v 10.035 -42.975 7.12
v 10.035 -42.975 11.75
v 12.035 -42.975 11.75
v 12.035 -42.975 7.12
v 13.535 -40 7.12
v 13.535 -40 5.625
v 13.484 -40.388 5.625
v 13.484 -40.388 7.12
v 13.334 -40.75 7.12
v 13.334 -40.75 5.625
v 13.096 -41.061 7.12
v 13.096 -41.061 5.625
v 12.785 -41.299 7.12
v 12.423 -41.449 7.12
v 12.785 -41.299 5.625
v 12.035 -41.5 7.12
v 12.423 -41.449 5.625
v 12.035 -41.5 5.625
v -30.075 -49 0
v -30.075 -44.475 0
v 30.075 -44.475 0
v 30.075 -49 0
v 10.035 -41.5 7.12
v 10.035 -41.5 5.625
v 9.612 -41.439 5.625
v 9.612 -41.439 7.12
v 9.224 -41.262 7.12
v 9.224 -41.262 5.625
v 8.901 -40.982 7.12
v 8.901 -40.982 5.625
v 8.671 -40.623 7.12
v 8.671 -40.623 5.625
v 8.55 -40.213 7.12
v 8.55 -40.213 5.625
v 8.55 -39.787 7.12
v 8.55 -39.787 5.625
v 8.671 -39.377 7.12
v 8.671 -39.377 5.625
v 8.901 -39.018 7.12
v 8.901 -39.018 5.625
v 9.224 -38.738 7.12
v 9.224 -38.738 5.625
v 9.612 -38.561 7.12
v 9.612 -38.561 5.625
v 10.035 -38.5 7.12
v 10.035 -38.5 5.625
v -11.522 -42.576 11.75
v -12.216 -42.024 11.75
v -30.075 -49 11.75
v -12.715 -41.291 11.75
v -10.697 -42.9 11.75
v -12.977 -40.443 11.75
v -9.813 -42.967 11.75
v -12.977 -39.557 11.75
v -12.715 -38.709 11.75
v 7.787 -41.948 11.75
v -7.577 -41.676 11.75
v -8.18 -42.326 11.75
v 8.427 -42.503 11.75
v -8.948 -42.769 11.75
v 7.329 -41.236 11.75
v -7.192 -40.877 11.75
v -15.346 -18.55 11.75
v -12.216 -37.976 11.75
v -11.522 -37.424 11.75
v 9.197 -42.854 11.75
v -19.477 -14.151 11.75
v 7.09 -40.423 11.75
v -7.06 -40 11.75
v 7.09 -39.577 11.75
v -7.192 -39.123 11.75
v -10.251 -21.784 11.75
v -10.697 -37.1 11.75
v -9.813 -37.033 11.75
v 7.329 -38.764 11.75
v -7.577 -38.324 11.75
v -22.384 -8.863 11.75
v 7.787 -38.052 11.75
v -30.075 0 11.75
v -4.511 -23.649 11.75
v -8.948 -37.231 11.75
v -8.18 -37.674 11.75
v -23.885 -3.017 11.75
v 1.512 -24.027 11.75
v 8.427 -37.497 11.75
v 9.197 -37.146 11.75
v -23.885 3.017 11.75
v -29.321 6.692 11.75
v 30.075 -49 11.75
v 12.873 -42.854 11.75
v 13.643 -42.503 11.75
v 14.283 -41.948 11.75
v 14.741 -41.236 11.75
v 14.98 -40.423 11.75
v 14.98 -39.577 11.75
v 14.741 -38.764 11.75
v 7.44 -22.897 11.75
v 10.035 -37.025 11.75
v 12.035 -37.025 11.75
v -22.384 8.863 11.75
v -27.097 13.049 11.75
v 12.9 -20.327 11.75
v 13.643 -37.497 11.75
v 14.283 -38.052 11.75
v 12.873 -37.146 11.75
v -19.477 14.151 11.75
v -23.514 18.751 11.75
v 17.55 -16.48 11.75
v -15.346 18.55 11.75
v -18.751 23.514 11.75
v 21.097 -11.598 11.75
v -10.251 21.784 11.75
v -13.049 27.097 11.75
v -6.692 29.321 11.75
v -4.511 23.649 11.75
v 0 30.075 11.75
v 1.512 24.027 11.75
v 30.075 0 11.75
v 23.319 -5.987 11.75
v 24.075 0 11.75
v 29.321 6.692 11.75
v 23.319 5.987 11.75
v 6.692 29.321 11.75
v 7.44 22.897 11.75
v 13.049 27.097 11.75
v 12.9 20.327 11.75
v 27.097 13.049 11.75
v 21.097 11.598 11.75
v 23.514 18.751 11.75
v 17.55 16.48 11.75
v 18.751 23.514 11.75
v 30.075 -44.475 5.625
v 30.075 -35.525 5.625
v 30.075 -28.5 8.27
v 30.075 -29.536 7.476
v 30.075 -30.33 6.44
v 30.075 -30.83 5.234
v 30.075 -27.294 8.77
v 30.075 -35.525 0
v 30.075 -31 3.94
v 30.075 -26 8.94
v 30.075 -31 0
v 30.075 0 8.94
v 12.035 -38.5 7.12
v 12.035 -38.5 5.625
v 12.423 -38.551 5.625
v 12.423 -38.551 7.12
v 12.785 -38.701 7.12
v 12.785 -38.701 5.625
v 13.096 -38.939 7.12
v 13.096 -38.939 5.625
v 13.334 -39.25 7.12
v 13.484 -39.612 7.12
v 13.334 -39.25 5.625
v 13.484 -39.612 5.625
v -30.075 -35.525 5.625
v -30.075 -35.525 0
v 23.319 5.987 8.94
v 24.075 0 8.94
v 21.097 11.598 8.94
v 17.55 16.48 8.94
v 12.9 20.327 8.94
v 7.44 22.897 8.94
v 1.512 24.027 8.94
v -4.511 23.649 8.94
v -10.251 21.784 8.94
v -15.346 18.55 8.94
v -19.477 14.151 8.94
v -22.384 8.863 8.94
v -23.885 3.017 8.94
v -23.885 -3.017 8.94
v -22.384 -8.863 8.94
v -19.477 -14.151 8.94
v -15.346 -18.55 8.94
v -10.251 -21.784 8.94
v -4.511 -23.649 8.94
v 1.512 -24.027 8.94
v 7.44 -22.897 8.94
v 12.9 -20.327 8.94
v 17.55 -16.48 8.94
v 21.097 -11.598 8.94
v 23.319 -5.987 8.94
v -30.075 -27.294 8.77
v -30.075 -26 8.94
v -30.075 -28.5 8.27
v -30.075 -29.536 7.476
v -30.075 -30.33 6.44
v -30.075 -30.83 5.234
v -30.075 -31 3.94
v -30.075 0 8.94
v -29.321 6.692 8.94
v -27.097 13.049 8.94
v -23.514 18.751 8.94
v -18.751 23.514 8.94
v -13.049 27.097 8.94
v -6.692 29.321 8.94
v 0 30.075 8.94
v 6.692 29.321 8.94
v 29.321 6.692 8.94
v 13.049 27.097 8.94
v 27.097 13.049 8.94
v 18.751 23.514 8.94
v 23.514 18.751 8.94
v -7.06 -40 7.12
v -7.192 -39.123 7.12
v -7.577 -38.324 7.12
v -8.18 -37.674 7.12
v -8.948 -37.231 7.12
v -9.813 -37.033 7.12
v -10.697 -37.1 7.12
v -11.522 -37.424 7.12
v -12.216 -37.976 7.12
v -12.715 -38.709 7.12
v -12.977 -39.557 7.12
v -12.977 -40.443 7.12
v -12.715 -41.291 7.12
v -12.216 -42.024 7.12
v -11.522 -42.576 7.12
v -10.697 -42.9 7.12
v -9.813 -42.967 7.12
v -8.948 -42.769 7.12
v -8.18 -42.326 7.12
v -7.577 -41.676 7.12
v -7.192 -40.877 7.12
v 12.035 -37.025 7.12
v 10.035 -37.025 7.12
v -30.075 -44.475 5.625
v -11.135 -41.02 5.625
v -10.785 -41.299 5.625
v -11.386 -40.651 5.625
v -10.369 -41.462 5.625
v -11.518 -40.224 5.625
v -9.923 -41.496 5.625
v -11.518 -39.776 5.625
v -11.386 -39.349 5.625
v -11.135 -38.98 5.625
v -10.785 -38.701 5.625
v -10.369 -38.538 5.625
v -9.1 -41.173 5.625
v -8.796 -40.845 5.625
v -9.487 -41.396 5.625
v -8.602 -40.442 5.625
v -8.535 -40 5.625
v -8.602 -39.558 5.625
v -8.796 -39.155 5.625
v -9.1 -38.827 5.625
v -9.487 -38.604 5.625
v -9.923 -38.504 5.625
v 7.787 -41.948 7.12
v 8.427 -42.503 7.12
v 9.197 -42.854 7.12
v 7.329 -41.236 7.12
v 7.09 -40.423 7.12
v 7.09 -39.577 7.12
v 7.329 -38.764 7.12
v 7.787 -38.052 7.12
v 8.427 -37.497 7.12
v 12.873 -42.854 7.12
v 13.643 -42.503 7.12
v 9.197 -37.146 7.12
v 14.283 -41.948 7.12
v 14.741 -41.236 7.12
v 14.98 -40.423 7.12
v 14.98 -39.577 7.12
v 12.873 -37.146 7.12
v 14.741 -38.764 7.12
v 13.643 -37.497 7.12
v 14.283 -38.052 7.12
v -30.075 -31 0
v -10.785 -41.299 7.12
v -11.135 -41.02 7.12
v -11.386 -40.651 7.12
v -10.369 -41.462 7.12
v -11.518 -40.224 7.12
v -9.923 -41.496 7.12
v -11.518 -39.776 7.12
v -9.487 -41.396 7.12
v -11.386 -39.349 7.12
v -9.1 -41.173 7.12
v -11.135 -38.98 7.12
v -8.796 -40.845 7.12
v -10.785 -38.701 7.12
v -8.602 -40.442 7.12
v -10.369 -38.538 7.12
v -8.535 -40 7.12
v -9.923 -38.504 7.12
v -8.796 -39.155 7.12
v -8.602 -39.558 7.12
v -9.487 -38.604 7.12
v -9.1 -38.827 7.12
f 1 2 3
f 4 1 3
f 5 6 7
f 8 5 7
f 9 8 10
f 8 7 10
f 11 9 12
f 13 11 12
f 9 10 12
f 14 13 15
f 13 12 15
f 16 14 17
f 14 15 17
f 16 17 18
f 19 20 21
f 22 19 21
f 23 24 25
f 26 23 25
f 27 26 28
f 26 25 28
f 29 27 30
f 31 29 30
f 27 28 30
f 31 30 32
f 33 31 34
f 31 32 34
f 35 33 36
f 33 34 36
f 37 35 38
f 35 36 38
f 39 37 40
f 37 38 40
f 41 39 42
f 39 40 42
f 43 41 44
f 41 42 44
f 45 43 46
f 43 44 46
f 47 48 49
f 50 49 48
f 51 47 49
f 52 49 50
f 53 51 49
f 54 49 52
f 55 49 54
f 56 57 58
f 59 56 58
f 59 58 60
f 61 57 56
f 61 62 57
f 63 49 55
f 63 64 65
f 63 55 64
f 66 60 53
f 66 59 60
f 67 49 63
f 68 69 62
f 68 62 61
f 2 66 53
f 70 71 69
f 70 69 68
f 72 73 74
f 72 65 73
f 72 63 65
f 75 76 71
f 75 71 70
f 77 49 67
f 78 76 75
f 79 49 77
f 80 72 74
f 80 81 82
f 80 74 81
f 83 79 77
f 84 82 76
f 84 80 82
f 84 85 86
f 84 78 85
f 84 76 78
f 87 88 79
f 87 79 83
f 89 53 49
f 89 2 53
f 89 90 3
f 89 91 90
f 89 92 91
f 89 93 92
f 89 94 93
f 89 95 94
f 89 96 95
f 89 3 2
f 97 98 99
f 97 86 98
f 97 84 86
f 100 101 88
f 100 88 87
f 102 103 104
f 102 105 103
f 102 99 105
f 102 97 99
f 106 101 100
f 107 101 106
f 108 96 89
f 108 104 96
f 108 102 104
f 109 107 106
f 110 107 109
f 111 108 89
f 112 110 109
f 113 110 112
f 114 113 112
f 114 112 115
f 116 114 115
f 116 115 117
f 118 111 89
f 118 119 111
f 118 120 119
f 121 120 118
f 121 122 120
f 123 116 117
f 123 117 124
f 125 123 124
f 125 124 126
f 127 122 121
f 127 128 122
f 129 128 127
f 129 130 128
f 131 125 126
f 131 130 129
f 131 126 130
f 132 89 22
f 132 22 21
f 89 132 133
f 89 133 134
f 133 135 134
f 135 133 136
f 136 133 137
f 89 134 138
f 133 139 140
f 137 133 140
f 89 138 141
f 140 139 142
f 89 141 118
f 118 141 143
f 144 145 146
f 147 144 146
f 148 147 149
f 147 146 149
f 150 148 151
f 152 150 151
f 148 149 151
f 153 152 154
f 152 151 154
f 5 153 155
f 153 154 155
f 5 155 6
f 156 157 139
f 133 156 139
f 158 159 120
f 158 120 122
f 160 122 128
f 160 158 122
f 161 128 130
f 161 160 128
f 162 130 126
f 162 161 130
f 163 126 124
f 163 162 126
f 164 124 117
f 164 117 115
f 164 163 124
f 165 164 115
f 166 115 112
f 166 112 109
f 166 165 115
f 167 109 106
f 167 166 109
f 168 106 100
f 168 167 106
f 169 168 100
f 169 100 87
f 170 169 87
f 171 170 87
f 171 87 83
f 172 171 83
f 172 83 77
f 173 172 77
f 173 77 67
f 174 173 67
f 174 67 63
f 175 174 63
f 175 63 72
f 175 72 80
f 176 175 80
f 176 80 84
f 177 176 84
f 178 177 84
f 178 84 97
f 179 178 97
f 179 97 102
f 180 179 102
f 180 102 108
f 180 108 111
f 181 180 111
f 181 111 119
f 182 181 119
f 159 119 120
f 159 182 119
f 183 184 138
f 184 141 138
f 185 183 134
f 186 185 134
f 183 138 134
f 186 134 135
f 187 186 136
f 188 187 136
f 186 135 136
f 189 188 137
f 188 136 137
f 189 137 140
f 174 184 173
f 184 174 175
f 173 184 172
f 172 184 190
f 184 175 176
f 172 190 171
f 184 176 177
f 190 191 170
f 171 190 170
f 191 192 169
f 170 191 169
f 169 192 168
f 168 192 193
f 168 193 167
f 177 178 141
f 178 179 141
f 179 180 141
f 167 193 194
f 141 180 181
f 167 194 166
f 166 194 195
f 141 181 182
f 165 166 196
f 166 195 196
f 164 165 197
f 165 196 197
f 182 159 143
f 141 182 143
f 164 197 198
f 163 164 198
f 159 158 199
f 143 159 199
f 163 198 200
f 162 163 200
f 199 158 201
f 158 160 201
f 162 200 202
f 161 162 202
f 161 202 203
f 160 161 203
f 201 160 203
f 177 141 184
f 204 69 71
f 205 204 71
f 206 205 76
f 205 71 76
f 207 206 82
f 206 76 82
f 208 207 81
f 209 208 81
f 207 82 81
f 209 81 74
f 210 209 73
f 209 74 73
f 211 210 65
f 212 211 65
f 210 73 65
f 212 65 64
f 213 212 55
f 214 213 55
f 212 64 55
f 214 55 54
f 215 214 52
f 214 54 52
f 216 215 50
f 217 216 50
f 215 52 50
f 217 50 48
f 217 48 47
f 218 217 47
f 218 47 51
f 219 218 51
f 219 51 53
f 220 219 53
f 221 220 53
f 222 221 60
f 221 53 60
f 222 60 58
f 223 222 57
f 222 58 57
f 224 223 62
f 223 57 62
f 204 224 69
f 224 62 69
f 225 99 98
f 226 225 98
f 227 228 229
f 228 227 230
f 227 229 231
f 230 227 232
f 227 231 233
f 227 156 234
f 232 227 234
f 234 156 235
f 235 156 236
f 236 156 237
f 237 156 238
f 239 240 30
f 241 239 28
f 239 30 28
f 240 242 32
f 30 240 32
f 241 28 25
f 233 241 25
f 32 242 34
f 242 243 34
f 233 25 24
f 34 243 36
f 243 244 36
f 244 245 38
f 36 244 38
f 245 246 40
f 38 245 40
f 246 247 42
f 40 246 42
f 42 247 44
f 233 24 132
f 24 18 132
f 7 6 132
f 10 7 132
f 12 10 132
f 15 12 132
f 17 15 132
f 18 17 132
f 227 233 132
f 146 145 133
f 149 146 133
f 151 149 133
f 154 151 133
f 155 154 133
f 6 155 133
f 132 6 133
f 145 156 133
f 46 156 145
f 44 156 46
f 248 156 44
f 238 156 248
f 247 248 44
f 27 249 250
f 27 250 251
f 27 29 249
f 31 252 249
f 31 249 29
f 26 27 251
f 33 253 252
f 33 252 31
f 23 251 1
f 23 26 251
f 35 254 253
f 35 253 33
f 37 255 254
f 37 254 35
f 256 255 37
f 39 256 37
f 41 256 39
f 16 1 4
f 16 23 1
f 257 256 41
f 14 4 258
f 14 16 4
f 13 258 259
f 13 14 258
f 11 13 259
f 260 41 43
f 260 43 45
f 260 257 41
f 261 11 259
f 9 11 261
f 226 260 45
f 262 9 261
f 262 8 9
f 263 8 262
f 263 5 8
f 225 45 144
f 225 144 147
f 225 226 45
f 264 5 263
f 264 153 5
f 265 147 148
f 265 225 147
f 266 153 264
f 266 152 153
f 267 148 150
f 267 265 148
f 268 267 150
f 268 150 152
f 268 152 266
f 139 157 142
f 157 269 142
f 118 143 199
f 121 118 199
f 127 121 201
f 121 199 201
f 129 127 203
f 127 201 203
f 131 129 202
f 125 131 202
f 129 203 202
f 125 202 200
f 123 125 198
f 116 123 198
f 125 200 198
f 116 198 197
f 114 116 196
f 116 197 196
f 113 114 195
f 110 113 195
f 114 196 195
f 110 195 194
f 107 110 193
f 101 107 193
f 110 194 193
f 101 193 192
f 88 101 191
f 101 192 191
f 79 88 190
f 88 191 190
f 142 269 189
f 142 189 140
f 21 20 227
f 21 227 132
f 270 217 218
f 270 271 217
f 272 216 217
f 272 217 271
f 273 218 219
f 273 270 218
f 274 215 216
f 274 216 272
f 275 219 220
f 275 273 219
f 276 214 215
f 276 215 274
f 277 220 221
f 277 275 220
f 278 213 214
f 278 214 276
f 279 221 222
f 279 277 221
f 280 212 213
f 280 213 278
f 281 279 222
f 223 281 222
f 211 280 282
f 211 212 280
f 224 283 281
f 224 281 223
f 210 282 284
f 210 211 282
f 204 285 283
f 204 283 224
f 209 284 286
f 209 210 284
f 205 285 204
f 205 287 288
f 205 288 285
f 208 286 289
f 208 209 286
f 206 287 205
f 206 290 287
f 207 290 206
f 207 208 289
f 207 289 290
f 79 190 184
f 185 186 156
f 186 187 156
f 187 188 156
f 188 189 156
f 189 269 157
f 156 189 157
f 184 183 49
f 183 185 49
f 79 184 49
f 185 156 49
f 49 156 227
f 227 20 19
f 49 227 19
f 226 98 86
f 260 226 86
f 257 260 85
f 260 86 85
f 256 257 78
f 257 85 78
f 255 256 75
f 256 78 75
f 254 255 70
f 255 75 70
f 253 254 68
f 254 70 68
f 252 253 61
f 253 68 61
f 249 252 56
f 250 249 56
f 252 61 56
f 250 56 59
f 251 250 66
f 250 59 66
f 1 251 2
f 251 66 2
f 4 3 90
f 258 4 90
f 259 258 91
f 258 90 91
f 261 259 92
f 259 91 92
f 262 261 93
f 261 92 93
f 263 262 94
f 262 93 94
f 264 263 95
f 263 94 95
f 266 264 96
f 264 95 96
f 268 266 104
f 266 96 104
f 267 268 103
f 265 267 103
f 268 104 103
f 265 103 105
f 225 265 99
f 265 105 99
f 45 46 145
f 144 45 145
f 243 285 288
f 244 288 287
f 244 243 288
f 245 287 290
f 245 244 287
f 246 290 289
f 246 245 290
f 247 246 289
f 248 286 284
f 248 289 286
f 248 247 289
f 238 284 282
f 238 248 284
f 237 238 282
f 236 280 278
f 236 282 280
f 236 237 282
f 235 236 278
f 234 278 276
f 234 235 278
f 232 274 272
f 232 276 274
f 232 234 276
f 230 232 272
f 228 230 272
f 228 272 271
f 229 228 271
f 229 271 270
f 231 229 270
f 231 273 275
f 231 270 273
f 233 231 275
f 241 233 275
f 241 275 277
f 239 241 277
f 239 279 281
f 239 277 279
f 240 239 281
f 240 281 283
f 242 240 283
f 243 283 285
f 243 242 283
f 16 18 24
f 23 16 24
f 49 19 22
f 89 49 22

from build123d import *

# Parameters (mm, degrees)
F0_R     = 24.075
F0_W     = 60.15
F0_H     = 4.525
F0_H_2   = 8.95
F0_R_2   = 1.5
F1_DEPTH = 11.75
F2_DEPTH = 5.625
F3_R     = 2.975
F4_DEPTH = 4.63
F5_DEPTH = 8.94
F6_R     = 5


with BuildPart() as f1:
    # F0 (on Top) → F1 (new body)
    with BuildSketch(Plane.XY):
        with BuildLine():
            ThreePointArc((-30.075, 0), (0, -30.075), (30.075, 0))
            ThreePointArc((30.075, 0), (0, 30.075), (-30.075, 0))
        make_face()
        Circle(F0_R, mode=Mode.SUBTRACT)
        with BuildLine():
            Line((30.075, -31), (30.075, 0))
            ThreePointArc((30.075, 0), (0, -30.075), (-30.075, 0))
            Line((-30.075, 0), (-30.075, -31))
            Line((-30.075, -31), (30.075, -31))
        make_face()
        with Locations((0, -33.2625)):
            Rectangle(F0_W, F0_H)
        with Locations((0, -40)):
            Rectangle(F0_W, F0_H_2)
        with Locations((-10.035, -40)):
            Circle(F0_R_2, mode=Mode.SUBTRACT)
        with BuildLine():
            ThreePointArc((10.035, -41.5), (8.535, -40), (10.035, -38.5))
            Line((10.035, -38.5), (12.035, -38.5))
            ThreePointArc((12.035, -38.5), (13.0956601718, -38.9393398282), (13.535, -40))
            ThreePointArc((13.535, -40), (13.0956601718, -41.0606601718), (12.035, -41.5))
            Line((12.035, -41.5), (10.035, -41.5))
        make_face(mode=Mode.SUBTRACT)
        with Locations((0, -46.7375)):
            Rectangle(F0_W, F0_H)
    extrude(amount=F1_DEPTH)

    # F0 (on Top) → F2 (cut)
    with BuildSketch(Plane.XY):
        with Locations((0, -40)):
            Rectangle(F0_W, F0_H_2)
        with Locations((-10.035, -40)):
            Circle(F0_R_2, mode=Mode.SUBTRACT)
        with BuildLine():
            ThreePointArc((10.035, -41.5), (8.535, -40), (10.035, -38.5))
            Line((10.035, -38.5), (12.035, -38.5))
            ThreePointArc((12.035, -38.5), (13.0956601718, -38.9393398282), (13.535, -40))
            ThreePointArc((13.535, -40), (13.0956601718, -41.0606601718), (12.035, -41.5))
            Line((12.035, -41.5), (10.035, -41.5))
        make_face(mode=Mode.SUBTRACT)
    extrude(amount=F2_DEPTH, mode=Mode.SUBTRACT)

    # F3 (on face) → F4 (cut)
    with BuildSketch(Plane.XY.offset(11.75)):
        with Locations((-10.035, -40)):
            Circle(F3_R)
        with BuildLine():
            Line((12.035, -37.025), (10.035, -37.025))
            ThreePointArc((10.035, -37.025), (7.06, -40), (10.035, -42.975))
            Line((10.035, -42.975), (12.035, -42.975))
            ThreePointArc((12.035, -42.975), (15.01, -40), (12.035, -37.025))
        make_face()
        with BuildLine():
            ThreePointArc((10.035, -41.5), (8.535, -40), (10.035, -38.5))
            Line((10.035, -38.5), (12.035, -38.5))
            ThreePointArc((12.035, -38.5), (13.535, -40), (12.035, -41.5))
            Line((12.035, -41.5), (10.035, -41.5))
        make_face(mode=Mode.SUBTRACT)
    extrude(amount=-F4_DEPTH, mode=Mode.SUBTRACT)

    # F0 (on Top) → F5 (cut)
    with BuildSketch(Plane.XY):
        with BuildLine():
            ThreePointArc((-30.075, 0), (0, -30.075), (30.075, 0))
            ThreePointArc((30.075, 0), (0, 30.075), (-30.075, 0))
        make_face()
        Circle(F0_R, mode=Mode.SUBTRACT)
        with BuildLine():
            Line((30.075, -31), (30.075, 0))
            ThreePointArc((30.075, 0), (0, -30.075), (-30.075, 0))
            Line((-30.075, 0), (-30.075, -31))
            Line((-30.075, -31), (30.075, -31))
        make_face()
    extrude(amount=F5_DEPTH, mode=Mode.SUBTRACT)

    # F6
    f6_edges = [f1.edges().sort_by_distance(p)[0] for p in [
        (0, -31, 8.94),
    ]]
    fillet(f6_edges, radius=F6_R)


solid = f1.part
